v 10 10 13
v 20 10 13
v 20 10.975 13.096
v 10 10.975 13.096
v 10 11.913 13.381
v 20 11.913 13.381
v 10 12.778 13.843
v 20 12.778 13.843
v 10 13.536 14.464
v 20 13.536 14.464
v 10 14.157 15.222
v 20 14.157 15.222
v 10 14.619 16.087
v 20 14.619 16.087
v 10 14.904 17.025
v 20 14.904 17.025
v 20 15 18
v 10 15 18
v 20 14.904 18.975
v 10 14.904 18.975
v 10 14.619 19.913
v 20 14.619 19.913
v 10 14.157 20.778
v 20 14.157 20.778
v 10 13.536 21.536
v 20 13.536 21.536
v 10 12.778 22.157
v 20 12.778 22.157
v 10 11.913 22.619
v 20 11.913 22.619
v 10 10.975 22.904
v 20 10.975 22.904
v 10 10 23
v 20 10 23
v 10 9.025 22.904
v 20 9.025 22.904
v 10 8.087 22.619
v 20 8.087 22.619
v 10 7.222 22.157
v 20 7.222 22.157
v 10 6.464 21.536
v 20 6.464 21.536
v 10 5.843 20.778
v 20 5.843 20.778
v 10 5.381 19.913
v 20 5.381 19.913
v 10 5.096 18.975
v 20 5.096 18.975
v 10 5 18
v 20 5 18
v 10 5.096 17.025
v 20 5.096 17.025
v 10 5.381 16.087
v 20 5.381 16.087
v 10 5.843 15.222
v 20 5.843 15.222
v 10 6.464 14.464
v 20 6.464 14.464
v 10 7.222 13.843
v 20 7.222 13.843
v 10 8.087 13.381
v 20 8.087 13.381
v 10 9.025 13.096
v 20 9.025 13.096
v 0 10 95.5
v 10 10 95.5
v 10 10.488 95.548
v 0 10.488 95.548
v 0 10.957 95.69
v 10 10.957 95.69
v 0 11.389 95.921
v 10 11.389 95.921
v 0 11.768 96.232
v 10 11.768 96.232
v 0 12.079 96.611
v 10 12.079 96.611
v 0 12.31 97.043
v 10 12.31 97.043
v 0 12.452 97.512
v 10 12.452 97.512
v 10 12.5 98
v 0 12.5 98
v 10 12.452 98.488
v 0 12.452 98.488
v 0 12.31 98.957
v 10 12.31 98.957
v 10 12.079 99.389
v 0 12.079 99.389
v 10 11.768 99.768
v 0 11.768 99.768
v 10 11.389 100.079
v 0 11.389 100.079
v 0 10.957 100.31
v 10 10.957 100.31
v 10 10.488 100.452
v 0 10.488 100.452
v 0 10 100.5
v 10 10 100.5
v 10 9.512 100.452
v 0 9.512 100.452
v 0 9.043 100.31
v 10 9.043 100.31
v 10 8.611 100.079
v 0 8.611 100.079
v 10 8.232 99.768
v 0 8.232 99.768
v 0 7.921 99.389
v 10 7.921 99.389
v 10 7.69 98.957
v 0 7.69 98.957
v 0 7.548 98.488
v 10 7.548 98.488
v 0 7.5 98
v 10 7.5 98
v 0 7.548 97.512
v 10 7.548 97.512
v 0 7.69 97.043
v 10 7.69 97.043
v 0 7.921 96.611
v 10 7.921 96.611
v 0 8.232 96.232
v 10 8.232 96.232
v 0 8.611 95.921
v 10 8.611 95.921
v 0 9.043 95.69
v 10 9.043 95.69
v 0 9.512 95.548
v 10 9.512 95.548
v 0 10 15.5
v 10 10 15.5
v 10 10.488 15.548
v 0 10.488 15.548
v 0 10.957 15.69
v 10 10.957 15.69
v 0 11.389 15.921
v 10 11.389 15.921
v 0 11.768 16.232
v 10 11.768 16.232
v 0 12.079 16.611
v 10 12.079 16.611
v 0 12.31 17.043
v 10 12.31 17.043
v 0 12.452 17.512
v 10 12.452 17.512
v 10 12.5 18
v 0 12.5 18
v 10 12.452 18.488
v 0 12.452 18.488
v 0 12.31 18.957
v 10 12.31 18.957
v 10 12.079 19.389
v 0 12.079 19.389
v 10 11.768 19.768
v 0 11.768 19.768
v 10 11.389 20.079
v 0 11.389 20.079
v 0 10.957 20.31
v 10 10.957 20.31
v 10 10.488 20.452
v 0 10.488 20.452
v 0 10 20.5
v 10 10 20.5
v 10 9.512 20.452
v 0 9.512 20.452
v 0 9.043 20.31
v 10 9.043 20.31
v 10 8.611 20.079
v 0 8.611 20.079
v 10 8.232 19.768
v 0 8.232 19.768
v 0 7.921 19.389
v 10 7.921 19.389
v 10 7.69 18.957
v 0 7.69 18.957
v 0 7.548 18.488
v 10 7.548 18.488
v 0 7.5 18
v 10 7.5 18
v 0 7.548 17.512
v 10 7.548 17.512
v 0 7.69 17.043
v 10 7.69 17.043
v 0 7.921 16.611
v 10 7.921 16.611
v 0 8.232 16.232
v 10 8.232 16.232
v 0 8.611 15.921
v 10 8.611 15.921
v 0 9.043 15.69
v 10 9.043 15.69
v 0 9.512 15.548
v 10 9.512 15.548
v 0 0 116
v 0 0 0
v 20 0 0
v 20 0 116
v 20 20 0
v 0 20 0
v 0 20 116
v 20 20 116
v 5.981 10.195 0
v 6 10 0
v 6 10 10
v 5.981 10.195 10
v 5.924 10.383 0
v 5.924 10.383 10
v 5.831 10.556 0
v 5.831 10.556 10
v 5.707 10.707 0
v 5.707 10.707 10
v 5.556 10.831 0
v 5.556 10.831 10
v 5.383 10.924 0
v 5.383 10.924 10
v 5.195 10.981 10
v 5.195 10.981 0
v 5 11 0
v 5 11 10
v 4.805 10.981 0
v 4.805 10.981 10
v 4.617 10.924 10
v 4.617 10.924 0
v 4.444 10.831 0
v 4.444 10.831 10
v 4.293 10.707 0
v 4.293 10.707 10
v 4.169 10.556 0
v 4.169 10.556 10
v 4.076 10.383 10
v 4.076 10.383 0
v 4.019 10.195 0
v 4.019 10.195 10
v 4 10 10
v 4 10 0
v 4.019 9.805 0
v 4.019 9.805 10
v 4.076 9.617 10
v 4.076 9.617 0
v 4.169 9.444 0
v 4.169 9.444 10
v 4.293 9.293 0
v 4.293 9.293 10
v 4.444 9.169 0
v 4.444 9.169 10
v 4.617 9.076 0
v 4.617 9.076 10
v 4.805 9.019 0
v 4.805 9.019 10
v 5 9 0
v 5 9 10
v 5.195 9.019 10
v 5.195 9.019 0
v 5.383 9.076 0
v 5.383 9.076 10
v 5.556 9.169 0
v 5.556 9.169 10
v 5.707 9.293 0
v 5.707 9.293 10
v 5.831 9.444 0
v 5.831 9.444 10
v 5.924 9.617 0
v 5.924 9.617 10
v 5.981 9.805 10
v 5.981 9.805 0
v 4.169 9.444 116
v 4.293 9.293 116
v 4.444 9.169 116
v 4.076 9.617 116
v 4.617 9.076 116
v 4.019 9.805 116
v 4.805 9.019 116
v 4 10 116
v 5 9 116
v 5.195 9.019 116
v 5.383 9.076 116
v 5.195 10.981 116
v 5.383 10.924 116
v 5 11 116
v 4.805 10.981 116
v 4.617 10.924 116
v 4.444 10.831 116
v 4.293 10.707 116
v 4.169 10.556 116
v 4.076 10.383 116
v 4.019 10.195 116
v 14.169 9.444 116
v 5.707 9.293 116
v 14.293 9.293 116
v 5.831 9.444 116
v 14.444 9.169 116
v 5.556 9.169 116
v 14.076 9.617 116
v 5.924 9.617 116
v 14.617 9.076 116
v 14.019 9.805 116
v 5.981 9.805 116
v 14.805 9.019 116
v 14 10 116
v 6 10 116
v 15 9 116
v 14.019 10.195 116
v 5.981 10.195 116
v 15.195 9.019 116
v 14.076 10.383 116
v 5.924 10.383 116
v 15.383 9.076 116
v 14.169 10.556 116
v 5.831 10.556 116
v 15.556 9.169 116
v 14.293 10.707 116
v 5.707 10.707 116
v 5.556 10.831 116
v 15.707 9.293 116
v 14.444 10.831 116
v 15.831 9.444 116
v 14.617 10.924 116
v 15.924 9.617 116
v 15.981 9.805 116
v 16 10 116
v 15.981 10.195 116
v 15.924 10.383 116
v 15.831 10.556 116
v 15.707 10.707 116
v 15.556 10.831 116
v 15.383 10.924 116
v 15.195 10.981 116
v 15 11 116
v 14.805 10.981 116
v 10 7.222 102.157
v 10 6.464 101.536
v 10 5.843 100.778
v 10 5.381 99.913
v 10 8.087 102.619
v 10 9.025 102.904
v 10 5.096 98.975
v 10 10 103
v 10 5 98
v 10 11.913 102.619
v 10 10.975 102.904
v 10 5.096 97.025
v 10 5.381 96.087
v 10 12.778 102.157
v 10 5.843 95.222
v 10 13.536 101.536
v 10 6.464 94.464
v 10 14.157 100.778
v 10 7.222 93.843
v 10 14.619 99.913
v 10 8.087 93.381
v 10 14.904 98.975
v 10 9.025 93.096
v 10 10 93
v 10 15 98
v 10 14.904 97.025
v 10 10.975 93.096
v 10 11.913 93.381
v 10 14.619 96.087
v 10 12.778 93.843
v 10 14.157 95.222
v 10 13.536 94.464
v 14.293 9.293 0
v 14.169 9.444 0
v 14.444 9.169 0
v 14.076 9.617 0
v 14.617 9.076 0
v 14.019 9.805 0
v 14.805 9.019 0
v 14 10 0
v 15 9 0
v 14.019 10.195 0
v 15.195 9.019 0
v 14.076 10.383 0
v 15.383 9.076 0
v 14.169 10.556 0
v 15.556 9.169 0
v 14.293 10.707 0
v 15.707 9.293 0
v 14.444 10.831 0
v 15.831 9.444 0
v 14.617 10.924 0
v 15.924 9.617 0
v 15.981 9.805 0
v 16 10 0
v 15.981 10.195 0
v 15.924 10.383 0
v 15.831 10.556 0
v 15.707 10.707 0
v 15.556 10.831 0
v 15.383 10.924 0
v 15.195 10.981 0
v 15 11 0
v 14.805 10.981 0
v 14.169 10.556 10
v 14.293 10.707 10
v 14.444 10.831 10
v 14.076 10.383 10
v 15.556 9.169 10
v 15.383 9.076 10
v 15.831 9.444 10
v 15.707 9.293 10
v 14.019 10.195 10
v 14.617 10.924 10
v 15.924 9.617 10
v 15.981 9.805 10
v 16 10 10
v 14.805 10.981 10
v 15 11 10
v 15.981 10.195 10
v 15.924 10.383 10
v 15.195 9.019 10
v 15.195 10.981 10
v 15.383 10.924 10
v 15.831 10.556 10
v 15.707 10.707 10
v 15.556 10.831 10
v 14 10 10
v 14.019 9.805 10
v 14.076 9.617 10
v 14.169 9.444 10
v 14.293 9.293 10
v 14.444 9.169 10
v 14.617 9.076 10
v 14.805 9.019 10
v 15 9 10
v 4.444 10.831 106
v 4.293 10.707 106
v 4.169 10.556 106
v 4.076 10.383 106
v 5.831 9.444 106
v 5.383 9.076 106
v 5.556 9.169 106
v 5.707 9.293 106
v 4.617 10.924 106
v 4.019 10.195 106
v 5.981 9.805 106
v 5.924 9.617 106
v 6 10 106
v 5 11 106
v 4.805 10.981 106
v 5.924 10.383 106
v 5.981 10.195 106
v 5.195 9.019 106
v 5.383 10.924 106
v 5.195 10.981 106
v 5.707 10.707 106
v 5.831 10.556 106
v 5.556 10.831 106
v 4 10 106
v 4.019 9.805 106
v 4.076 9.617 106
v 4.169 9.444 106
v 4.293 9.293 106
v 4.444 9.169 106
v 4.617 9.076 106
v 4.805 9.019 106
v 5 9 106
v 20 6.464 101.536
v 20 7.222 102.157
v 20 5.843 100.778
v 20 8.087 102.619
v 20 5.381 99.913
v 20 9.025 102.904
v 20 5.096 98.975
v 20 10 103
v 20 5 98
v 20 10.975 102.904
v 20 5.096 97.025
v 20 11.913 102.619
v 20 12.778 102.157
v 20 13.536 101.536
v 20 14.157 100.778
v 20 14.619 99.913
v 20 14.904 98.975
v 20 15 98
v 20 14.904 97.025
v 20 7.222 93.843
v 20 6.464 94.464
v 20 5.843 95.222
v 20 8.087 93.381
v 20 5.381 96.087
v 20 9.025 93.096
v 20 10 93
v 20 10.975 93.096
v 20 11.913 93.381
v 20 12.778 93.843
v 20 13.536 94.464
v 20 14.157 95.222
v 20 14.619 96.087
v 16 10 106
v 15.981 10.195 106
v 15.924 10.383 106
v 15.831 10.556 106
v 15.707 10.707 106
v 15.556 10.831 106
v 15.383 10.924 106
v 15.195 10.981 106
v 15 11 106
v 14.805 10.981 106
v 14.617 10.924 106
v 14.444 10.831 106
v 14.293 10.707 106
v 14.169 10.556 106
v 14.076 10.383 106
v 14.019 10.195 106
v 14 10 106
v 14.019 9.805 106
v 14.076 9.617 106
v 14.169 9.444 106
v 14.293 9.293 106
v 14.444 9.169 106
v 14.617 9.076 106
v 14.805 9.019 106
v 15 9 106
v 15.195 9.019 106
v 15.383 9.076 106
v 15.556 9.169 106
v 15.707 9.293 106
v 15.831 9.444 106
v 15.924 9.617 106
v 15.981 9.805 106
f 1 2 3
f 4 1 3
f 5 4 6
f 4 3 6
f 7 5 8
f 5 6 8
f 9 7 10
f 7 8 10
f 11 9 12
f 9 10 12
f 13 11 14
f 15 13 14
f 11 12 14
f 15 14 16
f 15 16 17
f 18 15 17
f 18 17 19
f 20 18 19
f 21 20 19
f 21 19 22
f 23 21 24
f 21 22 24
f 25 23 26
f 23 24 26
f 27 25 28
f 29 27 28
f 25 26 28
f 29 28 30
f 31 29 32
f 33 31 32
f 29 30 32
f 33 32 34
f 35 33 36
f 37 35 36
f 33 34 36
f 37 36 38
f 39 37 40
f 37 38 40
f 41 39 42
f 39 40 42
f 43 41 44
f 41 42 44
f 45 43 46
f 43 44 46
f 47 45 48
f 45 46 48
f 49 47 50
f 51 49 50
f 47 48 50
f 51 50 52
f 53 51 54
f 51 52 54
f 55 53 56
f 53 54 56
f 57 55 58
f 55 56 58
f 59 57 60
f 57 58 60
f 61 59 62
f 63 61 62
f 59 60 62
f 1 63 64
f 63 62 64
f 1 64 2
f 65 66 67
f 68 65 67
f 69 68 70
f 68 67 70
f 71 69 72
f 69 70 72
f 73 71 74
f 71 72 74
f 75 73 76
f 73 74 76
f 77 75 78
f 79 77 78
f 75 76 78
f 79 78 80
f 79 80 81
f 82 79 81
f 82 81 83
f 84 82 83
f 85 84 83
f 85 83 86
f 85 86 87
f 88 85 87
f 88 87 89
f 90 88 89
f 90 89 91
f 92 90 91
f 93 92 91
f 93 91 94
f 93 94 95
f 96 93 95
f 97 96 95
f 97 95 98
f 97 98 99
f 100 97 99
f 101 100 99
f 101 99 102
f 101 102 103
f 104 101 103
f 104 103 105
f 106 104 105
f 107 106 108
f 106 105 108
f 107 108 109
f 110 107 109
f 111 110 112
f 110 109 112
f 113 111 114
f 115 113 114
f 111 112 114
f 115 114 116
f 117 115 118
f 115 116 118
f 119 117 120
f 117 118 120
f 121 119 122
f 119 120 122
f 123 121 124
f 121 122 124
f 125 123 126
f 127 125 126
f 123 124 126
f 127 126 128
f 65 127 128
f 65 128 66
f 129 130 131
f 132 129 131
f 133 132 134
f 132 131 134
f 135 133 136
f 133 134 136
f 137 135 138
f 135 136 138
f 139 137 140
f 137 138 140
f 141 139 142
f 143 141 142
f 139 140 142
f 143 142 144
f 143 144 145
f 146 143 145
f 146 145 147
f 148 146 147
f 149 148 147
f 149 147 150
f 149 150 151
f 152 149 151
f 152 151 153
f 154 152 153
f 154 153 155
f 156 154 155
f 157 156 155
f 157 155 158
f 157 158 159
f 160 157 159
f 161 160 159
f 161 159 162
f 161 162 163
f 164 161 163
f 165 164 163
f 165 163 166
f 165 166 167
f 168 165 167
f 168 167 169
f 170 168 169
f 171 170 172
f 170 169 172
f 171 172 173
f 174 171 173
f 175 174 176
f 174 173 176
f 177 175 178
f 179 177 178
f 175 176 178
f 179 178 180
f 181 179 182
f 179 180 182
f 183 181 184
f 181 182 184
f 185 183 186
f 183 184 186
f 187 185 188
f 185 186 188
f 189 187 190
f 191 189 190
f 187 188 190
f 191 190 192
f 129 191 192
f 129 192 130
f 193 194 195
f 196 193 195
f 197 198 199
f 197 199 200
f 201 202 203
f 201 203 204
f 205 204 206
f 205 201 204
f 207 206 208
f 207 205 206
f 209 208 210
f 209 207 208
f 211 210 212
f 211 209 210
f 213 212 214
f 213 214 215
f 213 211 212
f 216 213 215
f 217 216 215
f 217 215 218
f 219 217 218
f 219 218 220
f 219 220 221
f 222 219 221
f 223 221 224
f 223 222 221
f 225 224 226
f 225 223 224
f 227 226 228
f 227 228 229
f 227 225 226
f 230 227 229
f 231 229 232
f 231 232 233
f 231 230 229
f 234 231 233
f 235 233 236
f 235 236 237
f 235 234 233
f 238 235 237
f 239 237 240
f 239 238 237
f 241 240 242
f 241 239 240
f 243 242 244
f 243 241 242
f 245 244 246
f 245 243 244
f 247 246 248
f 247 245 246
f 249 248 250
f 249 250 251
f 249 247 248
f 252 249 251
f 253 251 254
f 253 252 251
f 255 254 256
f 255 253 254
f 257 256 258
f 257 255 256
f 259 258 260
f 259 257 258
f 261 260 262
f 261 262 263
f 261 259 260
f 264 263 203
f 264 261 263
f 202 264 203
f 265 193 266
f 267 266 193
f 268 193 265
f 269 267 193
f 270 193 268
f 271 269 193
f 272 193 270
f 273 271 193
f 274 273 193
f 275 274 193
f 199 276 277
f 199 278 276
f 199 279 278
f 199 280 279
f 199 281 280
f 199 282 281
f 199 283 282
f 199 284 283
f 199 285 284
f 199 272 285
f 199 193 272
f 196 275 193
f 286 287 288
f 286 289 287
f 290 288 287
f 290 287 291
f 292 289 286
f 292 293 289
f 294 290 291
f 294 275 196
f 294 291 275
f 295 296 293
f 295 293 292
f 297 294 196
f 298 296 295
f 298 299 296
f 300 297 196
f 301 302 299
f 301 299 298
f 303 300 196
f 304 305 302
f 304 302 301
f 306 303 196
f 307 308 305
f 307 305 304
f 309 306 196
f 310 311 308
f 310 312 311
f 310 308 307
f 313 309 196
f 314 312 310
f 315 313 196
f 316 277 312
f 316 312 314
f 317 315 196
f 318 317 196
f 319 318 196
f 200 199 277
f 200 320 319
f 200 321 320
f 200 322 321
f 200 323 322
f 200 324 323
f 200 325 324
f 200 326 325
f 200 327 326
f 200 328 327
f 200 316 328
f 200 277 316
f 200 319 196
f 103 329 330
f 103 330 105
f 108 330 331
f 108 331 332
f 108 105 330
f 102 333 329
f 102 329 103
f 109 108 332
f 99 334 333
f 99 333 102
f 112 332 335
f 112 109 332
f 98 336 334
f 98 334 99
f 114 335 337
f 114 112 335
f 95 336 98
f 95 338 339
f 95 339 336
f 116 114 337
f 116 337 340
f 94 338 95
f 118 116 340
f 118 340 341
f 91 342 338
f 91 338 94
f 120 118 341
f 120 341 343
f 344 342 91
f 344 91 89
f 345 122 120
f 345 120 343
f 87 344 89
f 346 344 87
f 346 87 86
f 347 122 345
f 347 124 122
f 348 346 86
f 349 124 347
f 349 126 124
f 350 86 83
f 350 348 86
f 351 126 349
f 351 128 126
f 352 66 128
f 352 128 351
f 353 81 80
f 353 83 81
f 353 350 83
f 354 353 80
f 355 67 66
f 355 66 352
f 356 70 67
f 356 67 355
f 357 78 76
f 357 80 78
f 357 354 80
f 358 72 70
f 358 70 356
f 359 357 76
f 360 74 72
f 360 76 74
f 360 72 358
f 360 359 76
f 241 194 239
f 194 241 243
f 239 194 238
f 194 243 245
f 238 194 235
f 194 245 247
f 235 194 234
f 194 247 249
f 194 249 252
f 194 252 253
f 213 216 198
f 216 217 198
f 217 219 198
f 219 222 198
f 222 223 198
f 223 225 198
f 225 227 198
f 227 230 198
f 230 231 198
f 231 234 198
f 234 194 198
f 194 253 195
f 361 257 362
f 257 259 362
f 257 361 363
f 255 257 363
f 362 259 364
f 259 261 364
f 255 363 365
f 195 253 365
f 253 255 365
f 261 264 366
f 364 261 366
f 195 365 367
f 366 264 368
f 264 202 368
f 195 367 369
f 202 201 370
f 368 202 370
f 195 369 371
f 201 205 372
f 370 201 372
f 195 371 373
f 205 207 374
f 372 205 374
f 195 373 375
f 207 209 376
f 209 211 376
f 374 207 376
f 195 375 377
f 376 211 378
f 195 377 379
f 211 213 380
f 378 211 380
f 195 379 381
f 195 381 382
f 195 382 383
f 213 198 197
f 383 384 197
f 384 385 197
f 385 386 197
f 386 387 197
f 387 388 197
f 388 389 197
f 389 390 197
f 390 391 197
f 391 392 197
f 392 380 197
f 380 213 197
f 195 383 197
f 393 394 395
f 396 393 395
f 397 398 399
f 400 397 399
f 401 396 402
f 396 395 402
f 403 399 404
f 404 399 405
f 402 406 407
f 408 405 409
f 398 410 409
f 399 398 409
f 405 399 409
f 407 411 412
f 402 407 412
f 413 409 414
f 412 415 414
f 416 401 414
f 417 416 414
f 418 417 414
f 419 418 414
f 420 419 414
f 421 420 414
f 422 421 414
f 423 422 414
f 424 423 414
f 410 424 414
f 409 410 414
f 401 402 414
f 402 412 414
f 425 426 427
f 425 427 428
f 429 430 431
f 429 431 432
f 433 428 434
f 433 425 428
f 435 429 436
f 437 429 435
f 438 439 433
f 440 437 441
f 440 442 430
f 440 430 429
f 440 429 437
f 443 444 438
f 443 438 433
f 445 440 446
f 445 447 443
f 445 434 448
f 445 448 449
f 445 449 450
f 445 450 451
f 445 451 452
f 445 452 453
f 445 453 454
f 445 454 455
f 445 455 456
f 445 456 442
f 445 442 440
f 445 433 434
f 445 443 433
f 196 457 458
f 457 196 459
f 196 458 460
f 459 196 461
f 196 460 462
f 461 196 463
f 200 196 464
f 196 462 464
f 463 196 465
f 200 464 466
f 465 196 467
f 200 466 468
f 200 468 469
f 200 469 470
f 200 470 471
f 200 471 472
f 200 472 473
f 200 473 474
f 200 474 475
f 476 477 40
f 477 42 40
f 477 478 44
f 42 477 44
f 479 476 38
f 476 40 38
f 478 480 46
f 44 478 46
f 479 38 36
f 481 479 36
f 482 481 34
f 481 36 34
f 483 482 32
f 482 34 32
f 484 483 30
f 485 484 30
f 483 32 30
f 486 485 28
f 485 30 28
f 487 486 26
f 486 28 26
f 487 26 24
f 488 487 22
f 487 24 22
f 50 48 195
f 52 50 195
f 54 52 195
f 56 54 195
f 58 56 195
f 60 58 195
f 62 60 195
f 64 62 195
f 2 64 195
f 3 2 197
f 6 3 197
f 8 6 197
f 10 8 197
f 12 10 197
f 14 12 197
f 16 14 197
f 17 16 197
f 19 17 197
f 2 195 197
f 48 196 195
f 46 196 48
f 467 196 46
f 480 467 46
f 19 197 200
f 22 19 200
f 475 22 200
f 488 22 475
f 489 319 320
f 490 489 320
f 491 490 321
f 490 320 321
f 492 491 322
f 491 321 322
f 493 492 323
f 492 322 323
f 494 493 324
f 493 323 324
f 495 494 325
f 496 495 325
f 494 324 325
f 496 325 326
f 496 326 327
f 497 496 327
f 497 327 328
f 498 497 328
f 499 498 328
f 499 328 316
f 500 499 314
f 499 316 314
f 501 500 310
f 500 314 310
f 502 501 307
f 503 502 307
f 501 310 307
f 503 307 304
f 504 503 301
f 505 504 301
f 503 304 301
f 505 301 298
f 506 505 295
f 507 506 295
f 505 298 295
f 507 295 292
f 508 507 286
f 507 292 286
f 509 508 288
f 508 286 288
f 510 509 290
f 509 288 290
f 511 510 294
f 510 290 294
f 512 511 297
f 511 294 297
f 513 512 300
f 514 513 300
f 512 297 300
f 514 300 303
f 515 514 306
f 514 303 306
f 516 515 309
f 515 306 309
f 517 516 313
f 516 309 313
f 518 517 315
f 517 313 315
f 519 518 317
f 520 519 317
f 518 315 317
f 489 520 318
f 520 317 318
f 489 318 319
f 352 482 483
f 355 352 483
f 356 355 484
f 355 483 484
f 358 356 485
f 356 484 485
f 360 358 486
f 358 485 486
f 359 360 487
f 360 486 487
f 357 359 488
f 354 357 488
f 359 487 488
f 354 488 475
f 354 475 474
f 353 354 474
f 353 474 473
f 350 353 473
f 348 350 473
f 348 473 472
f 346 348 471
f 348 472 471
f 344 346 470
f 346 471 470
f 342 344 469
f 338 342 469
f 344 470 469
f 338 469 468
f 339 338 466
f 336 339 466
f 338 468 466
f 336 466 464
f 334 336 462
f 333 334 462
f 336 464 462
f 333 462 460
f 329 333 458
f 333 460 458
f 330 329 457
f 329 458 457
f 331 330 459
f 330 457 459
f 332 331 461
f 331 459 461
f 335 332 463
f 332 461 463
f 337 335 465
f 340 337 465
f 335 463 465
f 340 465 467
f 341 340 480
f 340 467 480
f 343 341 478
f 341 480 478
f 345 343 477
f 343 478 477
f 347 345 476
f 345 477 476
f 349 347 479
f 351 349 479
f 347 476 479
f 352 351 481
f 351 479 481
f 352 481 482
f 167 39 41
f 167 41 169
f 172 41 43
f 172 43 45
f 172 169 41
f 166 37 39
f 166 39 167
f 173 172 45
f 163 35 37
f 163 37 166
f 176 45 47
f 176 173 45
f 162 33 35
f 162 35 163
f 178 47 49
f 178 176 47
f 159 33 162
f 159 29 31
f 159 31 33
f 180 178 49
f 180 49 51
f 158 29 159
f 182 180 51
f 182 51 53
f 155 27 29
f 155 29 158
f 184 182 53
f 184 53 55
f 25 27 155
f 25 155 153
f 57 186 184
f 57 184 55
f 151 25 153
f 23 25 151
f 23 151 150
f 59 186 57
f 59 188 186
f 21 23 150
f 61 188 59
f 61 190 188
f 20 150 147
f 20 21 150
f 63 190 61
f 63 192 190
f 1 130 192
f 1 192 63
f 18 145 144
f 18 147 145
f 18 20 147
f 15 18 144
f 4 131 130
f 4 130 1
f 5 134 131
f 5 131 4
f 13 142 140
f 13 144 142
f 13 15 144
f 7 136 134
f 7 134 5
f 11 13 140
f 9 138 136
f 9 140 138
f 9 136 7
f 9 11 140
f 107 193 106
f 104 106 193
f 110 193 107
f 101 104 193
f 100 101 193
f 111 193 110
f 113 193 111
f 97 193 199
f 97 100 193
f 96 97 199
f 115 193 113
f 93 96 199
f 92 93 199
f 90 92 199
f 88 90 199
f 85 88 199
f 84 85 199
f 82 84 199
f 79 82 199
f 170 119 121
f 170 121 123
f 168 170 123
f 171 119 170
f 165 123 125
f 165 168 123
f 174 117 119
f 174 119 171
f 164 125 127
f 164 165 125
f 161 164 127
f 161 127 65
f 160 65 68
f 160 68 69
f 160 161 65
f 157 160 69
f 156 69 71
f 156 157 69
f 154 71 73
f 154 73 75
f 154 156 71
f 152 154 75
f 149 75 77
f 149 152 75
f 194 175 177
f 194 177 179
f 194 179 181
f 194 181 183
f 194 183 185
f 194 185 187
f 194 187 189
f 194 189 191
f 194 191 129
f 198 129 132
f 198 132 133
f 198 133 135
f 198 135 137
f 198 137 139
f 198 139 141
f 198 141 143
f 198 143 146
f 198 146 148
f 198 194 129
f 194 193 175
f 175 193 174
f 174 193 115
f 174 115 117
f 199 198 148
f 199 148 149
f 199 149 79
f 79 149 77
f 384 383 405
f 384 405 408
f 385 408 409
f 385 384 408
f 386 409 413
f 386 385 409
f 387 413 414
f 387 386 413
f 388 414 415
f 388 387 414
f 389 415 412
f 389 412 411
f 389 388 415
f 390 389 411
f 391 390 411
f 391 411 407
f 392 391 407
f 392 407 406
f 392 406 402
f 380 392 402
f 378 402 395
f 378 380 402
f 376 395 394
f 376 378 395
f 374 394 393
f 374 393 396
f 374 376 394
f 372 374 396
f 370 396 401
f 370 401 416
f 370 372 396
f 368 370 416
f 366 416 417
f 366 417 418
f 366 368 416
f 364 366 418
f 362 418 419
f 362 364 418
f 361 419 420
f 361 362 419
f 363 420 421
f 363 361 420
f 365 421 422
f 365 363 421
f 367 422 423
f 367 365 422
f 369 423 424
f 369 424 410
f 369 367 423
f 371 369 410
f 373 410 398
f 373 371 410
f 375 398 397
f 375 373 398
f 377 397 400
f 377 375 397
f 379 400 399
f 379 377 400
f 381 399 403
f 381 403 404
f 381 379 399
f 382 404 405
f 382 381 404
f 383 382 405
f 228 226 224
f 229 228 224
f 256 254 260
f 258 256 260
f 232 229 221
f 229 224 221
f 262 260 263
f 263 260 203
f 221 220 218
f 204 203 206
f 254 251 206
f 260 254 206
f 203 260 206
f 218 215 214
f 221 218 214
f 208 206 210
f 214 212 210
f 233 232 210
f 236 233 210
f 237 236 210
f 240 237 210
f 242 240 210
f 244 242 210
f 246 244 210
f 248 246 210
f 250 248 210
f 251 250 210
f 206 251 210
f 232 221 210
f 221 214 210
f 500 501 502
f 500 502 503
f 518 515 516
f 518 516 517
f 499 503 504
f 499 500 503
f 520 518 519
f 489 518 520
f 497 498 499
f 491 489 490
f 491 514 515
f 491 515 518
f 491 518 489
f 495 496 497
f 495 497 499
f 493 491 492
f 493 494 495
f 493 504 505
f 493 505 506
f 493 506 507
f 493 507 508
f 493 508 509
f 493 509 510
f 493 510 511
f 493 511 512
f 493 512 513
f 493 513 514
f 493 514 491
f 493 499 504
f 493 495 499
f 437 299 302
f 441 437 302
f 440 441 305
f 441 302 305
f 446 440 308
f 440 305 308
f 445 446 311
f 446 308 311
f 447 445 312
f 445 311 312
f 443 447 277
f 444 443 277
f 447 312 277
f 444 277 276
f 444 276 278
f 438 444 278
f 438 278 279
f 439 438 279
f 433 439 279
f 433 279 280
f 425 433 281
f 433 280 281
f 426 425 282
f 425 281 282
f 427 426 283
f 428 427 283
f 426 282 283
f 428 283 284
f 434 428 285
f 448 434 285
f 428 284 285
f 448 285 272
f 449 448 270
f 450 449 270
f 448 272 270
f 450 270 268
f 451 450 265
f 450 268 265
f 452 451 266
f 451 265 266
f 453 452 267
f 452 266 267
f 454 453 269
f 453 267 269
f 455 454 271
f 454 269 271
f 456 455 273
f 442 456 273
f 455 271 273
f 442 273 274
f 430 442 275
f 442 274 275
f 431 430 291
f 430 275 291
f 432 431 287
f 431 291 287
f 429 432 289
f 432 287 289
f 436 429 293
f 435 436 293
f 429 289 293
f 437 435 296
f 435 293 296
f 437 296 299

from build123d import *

# Parameters (mm, degrees)
SKETCH1_W           = 20
SKETCH1_H           = 20
BOSS_EXTRUDE1_DEPTH = 116
SKETCH1_5_R         = 1
CUT_EXTRUDE1_DEPTH  = 10
CUT_EXTRUDE2_START  = -10
SKETCH4_R           = 1
CUT_EXTRUDE2_DEPTH  = 10
SKETCH5_R           = 2.5
CUT_EXTRUDE3_DEPTH  = 120.398492453
SKETCH6_R           = 5
CUT_EXTRUDE4_DEPTH  = 10


with BuildPart() as part:
    # Sketch1 → Boss-Extrude1 (new body)
    with BuildSketch(Plane.XY):
        with Locations((10, 10)):
            Rectangle(SKETCH1_W, SKETCH1_H)
    extrude(amount=BOSS_EXTRUDE1_DEPTH)

    # Sketch1<5> → Cut-Extrude1 (cut)
    with BuildSketch(Plane.XY):
        with Locations((15, 10)):
            Circle(SKETCH1_5_R)
        with Locations((5, 10)):
            Circle(SKETCH1_5_R)
    extrude(amount=CUT_EXTRUDE1_DEPTH, mode=Mode.SUBTRACT)

    # Sketch4 → Cut-Extrude2 (cut)
    with BuildSketch(Plane.XY.offset(116).offset(CUT_EXTRUDE2_START)):
        with Locations((5, 10)):
            Circle(SKETCH4_R)
        with Locations((15, 10)):
            Circle(SKETCH4_R)
    extrude(amount=CUT_EXTRUDE2_DEPTH, mode=Mode.SUBTRACT)

    # Sketch5 → Cut-Extrude3 (cut, through all)
    with BuildSketch(Plane(origin=(20, 0, 0), x_dir=(0, 0, -1), z_dir=(1, 0, 0))):
        with Locations((-98, 10)):
            Circle(SKETCH5_R)
        with Locations((-18, 10)):
            Circle(SKETCH5_R)
    extrude(amount=-CUT_EXTRUDE3_DEPTH, mode=Mode.SUBTRACT)

    # Sketch6 → Cut-Extrude4 (cut)
    with BuildSketch(Plane(origin=(20, 0, 0), x_dir=(0, 0, -1), z_dir=(1, 0, 0))):
        with Locations((-98, 10)):
            Circle(SKETCH6_R)
        with Locations((-18, 10)):
            Circle(SKETCH6_R)
    extrude(amount=-CUT_EXTRUDE4_DEPTH, mode=Mode.SUBTRACT)


solid = part.part
